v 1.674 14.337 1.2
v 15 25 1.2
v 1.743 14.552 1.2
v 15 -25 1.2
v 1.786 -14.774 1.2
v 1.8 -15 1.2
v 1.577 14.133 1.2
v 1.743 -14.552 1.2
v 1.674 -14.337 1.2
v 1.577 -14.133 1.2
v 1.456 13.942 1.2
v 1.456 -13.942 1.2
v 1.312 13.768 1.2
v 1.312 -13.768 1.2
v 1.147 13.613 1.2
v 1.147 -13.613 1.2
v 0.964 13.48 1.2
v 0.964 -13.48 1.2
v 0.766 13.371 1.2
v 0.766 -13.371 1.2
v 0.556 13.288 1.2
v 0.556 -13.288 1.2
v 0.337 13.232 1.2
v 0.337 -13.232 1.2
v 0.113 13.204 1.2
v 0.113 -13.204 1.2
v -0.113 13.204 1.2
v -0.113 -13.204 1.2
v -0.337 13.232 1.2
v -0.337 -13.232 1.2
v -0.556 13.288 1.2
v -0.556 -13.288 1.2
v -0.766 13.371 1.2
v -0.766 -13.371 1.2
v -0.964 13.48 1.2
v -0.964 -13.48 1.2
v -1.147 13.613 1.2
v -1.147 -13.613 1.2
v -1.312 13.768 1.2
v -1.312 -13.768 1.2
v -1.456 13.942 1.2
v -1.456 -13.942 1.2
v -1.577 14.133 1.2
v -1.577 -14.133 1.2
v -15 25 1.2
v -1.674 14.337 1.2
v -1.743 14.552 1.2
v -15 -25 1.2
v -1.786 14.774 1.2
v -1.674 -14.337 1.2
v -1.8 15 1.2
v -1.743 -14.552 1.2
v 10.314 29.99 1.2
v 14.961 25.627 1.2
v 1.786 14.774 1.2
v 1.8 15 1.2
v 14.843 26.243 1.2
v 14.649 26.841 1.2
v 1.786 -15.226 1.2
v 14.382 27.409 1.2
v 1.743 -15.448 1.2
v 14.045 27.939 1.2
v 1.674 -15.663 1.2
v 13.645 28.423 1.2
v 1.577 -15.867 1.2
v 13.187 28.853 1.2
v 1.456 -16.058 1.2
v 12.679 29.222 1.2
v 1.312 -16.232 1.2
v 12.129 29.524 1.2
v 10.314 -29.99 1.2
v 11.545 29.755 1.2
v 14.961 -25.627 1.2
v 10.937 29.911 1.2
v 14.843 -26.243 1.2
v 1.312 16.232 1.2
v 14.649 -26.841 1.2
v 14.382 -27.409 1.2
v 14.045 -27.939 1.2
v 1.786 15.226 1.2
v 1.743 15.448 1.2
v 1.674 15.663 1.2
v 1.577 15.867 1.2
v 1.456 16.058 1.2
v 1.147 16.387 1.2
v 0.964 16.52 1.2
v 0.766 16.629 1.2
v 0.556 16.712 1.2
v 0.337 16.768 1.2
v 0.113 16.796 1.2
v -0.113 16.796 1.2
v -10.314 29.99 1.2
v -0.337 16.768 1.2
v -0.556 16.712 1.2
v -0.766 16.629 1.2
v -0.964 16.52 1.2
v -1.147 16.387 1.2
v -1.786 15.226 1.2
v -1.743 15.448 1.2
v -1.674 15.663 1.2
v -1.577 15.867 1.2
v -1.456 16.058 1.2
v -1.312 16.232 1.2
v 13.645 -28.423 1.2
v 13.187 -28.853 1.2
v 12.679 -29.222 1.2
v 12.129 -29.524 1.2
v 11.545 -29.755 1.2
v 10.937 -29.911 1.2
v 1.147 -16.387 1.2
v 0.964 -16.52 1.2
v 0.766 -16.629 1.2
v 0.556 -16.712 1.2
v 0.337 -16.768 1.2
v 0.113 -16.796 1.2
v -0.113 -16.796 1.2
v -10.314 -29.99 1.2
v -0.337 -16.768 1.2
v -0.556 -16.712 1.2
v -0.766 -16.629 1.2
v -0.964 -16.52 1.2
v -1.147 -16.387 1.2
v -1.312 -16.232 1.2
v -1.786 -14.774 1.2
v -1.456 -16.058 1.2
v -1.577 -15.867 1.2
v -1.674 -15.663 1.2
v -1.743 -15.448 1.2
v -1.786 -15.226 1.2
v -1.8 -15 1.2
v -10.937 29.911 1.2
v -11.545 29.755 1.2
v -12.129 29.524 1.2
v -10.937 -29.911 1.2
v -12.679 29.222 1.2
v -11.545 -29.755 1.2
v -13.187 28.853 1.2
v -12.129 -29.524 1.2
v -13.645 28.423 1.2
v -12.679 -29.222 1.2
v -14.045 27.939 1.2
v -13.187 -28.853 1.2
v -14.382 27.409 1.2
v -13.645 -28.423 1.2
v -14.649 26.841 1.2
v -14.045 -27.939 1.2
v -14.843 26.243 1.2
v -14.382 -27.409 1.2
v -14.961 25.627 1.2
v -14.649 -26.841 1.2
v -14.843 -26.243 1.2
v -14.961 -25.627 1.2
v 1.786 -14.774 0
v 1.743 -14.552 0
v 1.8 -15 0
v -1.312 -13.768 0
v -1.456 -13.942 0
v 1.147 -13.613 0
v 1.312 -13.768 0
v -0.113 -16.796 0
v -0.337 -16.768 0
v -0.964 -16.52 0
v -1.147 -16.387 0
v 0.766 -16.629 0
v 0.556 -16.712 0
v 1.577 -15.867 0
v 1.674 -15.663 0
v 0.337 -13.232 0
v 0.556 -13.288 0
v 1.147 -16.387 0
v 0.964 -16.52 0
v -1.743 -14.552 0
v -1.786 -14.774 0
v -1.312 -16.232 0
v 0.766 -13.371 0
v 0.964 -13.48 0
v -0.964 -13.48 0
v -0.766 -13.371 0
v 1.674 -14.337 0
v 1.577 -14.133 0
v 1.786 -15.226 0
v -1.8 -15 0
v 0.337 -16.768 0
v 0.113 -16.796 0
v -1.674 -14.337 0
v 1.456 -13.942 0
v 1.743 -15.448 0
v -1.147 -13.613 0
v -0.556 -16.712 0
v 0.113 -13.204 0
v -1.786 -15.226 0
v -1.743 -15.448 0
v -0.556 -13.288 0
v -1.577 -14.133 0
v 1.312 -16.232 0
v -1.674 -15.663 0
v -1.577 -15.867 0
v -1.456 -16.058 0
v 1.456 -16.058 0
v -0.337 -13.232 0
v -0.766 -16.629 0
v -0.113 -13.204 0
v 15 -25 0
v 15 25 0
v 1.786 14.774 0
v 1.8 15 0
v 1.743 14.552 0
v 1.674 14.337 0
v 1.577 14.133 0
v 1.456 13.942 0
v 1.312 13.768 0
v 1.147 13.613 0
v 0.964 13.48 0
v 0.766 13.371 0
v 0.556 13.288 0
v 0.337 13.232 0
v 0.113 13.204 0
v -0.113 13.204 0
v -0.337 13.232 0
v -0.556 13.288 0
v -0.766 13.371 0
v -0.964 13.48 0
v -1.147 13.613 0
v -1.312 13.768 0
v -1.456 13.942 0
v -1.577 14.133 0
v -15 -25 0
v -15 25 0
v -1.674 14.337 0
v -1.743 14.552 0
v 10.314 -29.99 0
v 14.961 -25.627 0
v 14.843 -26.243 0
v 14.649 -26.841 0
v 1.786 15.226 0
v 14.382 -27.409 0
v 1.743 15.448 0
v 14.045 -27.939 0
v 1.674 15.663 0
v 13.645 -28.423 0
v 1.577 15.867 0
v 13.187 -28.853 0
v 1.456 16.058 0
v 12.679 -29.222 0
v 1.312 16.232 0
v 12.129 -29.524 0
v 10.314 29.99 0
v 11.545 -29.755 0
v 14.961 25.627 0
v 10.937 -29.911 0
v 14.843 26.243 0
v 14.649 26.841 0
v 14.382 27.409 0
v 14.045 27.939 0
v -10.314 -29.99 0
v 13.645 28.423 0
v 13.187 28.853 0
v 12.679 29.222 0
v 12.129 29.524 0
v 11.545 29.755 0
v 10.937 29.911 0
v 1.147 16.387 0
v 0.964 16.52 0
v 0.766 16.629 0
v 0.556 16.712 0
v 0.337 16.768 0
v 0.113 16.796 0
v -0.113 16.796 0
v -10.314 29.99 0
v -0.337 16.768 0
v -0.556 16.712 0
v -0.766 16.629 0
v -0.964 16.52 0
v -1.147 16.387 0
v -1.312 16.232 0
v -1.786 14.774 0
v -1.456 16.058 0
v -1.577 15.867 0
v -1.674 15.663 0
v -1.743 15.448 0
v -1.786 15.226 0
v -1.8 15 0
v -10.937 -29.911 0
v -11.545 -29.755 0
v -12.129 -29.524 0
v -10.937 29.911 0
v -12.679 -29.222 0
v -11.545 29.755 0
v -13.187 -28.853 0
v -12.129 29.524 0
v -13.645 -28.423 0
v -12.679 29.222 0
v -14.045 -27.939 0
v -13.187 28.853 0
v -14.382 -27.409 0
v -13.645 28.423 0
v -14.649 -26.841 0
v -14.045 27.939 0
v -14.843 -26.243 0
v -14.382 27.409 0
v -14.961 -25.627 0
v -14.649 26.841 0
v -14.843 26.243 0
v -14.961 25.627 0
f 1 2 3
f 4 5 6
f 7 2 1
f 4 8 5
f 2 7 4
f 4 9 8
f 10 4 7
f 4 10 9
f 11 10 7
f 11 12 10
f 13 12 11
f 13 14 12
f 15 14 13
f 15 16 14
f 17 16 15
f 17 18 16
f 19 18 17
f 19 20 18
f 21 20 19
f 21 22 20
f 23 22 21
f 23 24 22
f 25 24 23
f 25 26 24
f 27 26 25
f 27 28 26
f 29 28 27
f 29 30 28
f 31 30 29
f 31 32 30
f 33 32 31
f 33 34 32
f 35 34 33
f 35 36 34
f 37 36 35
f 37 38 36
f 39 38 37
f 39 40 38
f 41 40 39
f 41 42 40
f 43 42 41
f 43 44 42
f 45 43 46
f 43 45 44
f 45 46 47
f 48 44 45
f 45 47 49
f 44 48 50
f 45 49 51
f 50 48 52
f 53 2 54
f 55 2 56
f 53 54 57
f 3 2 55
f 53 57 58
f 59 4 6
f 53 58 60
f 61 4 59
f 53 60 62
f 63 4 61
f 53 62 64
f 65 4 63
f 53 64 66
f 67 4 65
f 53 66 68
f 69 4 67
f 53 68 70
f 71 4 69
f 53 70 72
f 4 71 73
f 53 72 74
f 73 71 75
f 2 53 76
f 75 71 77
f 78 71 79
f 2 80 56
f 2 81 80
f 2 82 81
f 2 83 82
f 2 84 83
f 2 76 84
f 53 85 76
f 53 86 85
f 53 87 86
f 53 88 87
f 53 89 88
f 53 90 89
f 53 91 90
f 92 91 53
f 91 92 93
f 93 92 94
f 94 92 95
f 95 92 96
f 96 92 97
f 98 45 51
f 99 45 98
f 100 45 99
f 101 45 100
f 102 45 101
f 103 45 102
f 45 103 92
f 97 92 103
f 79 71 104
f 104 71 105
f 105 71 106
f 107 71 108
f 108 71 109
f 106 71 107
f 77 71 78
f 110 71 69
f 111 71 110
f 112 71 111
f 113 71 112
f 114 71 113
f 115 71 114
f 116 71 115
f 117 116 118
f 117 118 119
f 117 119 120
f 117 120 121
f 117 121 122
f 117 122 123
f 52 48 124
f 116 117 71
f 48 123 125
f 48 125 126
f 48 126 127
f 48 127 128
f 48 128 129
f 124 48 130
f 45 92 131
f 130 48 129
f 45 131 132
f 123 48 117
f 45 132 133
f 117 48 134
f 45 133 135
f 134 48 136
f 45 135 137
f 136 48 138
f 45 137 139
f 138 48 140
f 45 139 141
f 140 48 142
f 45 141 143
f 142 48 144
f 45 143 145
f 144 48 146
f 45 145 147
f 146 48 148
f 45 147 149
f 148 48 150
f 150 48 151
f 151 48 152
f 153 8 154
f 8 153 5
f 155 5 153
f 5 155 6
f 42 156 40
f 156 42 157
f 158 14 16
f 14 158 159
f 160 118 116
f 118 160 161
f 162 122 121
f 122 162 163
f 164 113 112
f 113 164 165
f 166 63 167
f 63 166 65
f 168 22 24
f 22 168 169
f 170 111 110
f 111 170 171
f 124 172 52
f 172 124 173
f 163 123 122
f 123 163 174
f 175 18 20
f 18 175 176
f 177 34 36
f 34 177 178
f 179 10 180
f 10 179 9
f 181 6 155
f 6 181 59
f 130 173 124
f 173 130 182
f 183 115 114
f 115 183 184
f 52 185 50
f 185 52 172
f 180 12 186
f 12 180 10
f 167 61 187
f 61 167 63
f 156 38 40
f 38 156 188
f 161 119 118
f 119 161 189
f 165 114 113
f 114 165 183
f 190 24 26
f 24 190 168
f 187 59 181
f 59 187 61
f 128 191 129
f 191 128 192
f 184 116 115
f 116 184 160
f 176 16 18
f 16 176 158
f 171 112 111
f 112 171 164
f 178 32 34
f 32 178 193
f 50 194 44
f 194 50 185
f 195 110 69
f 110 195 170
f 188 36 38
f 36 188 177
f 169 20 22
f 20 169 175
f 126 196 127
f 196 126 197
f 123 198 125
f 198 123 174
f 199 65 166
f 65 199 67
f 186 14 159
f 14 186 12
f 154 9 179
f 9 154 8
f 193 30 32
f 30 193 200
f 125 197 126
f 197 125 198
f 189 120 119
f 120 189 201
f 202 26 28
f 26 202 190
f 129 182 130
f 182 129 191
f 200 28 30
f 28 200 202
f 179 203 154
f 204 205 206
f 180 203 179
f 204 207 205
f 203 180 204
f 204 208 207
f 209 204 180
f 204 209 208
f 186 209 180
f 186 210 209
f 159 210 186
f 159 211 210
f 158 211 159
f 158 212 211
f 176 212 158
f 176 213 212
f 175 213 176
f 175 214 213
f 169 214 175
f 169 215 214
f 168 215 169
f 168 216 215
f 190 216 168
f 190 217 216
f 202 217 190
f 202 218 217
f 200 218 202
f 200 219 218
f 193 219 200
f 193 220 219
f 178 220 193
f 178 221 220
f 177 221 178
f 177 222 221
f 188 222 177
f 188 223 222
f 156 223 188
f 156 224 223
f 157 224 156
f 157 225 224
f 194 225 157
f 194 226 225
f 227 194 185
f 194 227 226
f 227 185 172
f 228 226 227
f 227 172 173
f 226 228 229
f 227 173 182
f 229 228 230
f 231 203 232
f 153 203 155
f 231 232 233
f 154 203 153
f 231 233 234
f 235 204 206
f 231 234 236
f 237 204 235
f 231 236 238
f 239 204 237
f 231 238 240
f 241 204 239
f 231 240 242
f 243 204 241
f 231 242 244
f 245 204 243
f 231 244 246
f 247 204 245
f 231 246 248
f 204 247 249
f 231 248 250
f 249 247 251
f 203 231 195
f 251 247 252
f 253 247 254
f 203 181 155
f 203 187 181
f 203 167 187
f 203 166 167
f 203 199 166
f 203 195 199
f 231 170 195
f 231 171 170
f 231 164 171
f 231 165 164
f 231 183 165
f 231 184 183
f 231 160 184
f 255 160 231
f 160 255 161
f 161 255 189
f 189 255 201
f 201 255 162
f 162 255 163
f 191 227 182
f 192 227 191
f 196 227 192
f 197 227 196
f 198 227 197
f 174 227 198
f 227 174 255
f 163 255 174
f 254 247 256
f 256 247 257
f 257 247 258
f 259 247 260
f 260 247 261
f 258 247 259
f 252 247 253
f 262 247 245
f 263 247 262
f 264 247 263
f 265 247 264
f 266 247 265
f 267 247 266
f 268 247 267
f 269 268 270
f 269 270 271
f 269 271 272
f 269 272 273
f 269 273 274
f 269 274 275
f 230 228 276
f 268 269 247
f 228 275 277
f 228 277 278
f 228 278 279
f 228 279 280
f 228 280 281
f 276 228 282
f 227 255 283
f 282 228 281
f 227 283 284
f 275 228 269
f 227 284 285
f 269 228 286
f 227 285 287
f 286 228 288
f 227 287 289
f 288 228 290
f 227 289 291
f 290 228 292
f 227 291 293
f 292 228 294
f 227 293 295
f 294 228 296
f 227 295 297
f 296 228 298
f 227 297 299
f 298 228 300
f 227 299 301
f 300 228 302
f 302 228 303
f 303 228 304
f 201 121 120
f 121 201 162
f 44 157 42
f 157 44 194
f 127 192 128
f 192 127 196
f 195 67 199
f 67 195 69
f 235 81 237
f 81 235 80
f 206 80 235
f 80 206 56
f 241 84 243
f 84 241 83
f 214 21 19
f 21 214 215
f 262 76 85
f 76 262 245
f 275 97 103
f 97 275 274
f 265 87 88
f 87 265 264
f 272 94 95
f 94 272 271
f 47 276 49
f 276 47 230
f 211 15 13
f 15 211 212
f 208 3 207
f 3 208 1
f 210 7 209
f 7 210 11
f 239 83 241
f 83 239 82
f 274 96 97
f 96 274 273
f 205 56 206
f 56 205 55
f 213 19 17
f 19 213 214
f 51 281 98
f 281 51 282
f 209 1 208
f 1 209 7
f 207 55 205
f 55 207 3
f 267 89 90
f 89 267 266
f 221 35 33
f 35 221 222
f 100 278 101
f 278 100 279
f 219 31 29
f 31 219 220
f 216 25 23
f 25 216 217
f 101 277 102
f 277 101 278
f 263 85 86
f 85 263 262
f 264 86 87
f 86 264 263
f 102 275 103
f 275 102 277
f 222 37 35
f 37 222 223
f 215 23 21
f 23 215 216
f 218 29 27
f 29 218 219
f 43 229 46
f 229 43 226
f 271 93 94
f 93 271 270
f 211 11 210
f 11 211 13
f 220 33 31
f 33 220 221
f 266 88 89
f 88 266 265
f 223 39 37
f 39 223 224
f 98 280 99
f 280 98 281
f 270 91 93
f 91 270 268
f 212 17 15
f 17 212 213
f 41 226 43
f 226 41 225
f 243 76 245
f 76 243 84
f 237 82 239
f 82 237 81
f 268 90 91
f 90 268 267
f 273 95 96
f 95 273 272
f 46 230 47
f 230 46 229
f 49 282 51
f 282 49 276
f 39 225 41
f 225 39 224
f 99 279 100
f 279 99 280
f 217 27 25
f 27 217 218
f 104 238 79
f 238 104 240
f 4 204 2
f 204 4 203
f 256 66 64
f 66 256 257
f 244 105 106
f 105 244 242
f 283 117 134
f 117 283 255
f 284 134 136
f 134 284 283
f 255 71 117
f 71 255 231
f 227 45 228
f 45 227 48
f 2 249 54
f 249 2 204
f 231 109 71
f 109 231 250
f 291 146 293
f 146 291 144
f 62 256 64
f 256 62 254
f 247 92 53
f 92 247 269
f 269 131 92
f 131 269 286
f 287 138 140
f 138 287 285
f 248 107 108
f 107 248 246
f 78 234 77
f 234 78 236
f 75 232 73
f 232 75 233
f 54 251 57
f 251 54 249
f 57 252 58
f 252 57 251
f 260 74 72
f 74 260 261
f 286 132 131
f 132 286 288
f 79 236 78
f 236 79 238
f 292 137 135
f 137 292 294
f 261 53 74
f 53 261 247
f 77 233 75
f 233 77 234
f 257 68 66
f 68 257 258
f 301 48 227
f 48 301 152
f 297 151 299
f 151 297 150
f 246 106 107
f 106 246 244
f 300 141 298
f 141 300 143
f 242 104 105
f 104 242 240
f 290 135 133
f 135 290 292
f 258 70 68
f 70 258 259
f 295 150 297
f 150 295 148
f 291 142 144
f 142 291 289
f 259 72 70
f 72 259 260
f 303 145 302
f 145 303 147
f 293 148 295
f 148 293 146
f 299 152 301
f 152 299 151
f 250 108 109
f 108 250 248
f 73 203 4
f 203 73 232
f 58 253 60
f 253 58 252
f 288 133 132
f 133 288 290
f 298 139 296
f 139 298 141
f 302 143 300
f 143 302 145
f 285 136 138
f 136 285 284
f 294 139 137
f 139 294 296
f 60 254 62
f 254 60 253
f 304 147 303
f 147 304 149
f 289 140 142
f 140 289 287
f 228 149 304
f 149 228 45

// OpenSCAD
$fn = 50;


difference() {
	union() {
		hull() {
			translate(v = [-10.0000000000, 25.0000000000, 0]) {
				cylinder(h = 30, r = 5);
			}
			translate(v = [10.0000000000, 25.0000000000, 0]) {
				cylinder(h = 30, r = 5);
			}
			translate(v = [-10.0000000000, -25.0000000000, 0]) {
				cylinder(h = 30, r = 5);
			}
			translate(v = [10.0000000000, -25.0000000000, 0]) {
				cylinder(h = 30, r = 5);
			}
		}
	}
	union() {
		translate(v = [0, 0, 1.2000000000]) {
			hull() {
				translate(v = [-10.0000000000, 25.0000000000, 0]) {
					cylinder(h = 28.8000000000, r = 3.8000000000);
				}
				translate(v = [10.0000000000, 25.0000000000, 0]) {
					cylinder(h = 28.8000000000, r = 3.8000000000);
				}
				translate(v = [-10.0000000000, -25.0000000000, 0]) {
					cylinder(h = 28.8000000000, r = 3.8000000000);
				}
				translate(v = [10.0000000000, -25.0000000000, 0]) {
					cylinder(h = 28.8000000000, r = 3.8000000000);
				}
			}
		}
		#translate(v = [0.0000000000, -15.0000000000, 0]) {
			cylinder(h = 1.2000000000, r = 1.8000000000);
		}
		#translate(v = [0.0000000000, 15.0000000000, 0]) {
			cylinder(h = 1.2000000000, r = 1.8000000000);
		}
		translate(v = [-250.0000000000, -250.0000000000, 1.2000000000]) {
			cube(size = [500, 500, 500]);
		}
		translate(v = [-250.0000000000, -250.0000000000, 1.2000000000]) {
			cube(size = [500, 500, 500]);
		}
		translate(v = [-250.0000000000, -250.0000000000, 1.2000000000]) {
			cube(size = [500, 500, 500]);
		}
	}
}
